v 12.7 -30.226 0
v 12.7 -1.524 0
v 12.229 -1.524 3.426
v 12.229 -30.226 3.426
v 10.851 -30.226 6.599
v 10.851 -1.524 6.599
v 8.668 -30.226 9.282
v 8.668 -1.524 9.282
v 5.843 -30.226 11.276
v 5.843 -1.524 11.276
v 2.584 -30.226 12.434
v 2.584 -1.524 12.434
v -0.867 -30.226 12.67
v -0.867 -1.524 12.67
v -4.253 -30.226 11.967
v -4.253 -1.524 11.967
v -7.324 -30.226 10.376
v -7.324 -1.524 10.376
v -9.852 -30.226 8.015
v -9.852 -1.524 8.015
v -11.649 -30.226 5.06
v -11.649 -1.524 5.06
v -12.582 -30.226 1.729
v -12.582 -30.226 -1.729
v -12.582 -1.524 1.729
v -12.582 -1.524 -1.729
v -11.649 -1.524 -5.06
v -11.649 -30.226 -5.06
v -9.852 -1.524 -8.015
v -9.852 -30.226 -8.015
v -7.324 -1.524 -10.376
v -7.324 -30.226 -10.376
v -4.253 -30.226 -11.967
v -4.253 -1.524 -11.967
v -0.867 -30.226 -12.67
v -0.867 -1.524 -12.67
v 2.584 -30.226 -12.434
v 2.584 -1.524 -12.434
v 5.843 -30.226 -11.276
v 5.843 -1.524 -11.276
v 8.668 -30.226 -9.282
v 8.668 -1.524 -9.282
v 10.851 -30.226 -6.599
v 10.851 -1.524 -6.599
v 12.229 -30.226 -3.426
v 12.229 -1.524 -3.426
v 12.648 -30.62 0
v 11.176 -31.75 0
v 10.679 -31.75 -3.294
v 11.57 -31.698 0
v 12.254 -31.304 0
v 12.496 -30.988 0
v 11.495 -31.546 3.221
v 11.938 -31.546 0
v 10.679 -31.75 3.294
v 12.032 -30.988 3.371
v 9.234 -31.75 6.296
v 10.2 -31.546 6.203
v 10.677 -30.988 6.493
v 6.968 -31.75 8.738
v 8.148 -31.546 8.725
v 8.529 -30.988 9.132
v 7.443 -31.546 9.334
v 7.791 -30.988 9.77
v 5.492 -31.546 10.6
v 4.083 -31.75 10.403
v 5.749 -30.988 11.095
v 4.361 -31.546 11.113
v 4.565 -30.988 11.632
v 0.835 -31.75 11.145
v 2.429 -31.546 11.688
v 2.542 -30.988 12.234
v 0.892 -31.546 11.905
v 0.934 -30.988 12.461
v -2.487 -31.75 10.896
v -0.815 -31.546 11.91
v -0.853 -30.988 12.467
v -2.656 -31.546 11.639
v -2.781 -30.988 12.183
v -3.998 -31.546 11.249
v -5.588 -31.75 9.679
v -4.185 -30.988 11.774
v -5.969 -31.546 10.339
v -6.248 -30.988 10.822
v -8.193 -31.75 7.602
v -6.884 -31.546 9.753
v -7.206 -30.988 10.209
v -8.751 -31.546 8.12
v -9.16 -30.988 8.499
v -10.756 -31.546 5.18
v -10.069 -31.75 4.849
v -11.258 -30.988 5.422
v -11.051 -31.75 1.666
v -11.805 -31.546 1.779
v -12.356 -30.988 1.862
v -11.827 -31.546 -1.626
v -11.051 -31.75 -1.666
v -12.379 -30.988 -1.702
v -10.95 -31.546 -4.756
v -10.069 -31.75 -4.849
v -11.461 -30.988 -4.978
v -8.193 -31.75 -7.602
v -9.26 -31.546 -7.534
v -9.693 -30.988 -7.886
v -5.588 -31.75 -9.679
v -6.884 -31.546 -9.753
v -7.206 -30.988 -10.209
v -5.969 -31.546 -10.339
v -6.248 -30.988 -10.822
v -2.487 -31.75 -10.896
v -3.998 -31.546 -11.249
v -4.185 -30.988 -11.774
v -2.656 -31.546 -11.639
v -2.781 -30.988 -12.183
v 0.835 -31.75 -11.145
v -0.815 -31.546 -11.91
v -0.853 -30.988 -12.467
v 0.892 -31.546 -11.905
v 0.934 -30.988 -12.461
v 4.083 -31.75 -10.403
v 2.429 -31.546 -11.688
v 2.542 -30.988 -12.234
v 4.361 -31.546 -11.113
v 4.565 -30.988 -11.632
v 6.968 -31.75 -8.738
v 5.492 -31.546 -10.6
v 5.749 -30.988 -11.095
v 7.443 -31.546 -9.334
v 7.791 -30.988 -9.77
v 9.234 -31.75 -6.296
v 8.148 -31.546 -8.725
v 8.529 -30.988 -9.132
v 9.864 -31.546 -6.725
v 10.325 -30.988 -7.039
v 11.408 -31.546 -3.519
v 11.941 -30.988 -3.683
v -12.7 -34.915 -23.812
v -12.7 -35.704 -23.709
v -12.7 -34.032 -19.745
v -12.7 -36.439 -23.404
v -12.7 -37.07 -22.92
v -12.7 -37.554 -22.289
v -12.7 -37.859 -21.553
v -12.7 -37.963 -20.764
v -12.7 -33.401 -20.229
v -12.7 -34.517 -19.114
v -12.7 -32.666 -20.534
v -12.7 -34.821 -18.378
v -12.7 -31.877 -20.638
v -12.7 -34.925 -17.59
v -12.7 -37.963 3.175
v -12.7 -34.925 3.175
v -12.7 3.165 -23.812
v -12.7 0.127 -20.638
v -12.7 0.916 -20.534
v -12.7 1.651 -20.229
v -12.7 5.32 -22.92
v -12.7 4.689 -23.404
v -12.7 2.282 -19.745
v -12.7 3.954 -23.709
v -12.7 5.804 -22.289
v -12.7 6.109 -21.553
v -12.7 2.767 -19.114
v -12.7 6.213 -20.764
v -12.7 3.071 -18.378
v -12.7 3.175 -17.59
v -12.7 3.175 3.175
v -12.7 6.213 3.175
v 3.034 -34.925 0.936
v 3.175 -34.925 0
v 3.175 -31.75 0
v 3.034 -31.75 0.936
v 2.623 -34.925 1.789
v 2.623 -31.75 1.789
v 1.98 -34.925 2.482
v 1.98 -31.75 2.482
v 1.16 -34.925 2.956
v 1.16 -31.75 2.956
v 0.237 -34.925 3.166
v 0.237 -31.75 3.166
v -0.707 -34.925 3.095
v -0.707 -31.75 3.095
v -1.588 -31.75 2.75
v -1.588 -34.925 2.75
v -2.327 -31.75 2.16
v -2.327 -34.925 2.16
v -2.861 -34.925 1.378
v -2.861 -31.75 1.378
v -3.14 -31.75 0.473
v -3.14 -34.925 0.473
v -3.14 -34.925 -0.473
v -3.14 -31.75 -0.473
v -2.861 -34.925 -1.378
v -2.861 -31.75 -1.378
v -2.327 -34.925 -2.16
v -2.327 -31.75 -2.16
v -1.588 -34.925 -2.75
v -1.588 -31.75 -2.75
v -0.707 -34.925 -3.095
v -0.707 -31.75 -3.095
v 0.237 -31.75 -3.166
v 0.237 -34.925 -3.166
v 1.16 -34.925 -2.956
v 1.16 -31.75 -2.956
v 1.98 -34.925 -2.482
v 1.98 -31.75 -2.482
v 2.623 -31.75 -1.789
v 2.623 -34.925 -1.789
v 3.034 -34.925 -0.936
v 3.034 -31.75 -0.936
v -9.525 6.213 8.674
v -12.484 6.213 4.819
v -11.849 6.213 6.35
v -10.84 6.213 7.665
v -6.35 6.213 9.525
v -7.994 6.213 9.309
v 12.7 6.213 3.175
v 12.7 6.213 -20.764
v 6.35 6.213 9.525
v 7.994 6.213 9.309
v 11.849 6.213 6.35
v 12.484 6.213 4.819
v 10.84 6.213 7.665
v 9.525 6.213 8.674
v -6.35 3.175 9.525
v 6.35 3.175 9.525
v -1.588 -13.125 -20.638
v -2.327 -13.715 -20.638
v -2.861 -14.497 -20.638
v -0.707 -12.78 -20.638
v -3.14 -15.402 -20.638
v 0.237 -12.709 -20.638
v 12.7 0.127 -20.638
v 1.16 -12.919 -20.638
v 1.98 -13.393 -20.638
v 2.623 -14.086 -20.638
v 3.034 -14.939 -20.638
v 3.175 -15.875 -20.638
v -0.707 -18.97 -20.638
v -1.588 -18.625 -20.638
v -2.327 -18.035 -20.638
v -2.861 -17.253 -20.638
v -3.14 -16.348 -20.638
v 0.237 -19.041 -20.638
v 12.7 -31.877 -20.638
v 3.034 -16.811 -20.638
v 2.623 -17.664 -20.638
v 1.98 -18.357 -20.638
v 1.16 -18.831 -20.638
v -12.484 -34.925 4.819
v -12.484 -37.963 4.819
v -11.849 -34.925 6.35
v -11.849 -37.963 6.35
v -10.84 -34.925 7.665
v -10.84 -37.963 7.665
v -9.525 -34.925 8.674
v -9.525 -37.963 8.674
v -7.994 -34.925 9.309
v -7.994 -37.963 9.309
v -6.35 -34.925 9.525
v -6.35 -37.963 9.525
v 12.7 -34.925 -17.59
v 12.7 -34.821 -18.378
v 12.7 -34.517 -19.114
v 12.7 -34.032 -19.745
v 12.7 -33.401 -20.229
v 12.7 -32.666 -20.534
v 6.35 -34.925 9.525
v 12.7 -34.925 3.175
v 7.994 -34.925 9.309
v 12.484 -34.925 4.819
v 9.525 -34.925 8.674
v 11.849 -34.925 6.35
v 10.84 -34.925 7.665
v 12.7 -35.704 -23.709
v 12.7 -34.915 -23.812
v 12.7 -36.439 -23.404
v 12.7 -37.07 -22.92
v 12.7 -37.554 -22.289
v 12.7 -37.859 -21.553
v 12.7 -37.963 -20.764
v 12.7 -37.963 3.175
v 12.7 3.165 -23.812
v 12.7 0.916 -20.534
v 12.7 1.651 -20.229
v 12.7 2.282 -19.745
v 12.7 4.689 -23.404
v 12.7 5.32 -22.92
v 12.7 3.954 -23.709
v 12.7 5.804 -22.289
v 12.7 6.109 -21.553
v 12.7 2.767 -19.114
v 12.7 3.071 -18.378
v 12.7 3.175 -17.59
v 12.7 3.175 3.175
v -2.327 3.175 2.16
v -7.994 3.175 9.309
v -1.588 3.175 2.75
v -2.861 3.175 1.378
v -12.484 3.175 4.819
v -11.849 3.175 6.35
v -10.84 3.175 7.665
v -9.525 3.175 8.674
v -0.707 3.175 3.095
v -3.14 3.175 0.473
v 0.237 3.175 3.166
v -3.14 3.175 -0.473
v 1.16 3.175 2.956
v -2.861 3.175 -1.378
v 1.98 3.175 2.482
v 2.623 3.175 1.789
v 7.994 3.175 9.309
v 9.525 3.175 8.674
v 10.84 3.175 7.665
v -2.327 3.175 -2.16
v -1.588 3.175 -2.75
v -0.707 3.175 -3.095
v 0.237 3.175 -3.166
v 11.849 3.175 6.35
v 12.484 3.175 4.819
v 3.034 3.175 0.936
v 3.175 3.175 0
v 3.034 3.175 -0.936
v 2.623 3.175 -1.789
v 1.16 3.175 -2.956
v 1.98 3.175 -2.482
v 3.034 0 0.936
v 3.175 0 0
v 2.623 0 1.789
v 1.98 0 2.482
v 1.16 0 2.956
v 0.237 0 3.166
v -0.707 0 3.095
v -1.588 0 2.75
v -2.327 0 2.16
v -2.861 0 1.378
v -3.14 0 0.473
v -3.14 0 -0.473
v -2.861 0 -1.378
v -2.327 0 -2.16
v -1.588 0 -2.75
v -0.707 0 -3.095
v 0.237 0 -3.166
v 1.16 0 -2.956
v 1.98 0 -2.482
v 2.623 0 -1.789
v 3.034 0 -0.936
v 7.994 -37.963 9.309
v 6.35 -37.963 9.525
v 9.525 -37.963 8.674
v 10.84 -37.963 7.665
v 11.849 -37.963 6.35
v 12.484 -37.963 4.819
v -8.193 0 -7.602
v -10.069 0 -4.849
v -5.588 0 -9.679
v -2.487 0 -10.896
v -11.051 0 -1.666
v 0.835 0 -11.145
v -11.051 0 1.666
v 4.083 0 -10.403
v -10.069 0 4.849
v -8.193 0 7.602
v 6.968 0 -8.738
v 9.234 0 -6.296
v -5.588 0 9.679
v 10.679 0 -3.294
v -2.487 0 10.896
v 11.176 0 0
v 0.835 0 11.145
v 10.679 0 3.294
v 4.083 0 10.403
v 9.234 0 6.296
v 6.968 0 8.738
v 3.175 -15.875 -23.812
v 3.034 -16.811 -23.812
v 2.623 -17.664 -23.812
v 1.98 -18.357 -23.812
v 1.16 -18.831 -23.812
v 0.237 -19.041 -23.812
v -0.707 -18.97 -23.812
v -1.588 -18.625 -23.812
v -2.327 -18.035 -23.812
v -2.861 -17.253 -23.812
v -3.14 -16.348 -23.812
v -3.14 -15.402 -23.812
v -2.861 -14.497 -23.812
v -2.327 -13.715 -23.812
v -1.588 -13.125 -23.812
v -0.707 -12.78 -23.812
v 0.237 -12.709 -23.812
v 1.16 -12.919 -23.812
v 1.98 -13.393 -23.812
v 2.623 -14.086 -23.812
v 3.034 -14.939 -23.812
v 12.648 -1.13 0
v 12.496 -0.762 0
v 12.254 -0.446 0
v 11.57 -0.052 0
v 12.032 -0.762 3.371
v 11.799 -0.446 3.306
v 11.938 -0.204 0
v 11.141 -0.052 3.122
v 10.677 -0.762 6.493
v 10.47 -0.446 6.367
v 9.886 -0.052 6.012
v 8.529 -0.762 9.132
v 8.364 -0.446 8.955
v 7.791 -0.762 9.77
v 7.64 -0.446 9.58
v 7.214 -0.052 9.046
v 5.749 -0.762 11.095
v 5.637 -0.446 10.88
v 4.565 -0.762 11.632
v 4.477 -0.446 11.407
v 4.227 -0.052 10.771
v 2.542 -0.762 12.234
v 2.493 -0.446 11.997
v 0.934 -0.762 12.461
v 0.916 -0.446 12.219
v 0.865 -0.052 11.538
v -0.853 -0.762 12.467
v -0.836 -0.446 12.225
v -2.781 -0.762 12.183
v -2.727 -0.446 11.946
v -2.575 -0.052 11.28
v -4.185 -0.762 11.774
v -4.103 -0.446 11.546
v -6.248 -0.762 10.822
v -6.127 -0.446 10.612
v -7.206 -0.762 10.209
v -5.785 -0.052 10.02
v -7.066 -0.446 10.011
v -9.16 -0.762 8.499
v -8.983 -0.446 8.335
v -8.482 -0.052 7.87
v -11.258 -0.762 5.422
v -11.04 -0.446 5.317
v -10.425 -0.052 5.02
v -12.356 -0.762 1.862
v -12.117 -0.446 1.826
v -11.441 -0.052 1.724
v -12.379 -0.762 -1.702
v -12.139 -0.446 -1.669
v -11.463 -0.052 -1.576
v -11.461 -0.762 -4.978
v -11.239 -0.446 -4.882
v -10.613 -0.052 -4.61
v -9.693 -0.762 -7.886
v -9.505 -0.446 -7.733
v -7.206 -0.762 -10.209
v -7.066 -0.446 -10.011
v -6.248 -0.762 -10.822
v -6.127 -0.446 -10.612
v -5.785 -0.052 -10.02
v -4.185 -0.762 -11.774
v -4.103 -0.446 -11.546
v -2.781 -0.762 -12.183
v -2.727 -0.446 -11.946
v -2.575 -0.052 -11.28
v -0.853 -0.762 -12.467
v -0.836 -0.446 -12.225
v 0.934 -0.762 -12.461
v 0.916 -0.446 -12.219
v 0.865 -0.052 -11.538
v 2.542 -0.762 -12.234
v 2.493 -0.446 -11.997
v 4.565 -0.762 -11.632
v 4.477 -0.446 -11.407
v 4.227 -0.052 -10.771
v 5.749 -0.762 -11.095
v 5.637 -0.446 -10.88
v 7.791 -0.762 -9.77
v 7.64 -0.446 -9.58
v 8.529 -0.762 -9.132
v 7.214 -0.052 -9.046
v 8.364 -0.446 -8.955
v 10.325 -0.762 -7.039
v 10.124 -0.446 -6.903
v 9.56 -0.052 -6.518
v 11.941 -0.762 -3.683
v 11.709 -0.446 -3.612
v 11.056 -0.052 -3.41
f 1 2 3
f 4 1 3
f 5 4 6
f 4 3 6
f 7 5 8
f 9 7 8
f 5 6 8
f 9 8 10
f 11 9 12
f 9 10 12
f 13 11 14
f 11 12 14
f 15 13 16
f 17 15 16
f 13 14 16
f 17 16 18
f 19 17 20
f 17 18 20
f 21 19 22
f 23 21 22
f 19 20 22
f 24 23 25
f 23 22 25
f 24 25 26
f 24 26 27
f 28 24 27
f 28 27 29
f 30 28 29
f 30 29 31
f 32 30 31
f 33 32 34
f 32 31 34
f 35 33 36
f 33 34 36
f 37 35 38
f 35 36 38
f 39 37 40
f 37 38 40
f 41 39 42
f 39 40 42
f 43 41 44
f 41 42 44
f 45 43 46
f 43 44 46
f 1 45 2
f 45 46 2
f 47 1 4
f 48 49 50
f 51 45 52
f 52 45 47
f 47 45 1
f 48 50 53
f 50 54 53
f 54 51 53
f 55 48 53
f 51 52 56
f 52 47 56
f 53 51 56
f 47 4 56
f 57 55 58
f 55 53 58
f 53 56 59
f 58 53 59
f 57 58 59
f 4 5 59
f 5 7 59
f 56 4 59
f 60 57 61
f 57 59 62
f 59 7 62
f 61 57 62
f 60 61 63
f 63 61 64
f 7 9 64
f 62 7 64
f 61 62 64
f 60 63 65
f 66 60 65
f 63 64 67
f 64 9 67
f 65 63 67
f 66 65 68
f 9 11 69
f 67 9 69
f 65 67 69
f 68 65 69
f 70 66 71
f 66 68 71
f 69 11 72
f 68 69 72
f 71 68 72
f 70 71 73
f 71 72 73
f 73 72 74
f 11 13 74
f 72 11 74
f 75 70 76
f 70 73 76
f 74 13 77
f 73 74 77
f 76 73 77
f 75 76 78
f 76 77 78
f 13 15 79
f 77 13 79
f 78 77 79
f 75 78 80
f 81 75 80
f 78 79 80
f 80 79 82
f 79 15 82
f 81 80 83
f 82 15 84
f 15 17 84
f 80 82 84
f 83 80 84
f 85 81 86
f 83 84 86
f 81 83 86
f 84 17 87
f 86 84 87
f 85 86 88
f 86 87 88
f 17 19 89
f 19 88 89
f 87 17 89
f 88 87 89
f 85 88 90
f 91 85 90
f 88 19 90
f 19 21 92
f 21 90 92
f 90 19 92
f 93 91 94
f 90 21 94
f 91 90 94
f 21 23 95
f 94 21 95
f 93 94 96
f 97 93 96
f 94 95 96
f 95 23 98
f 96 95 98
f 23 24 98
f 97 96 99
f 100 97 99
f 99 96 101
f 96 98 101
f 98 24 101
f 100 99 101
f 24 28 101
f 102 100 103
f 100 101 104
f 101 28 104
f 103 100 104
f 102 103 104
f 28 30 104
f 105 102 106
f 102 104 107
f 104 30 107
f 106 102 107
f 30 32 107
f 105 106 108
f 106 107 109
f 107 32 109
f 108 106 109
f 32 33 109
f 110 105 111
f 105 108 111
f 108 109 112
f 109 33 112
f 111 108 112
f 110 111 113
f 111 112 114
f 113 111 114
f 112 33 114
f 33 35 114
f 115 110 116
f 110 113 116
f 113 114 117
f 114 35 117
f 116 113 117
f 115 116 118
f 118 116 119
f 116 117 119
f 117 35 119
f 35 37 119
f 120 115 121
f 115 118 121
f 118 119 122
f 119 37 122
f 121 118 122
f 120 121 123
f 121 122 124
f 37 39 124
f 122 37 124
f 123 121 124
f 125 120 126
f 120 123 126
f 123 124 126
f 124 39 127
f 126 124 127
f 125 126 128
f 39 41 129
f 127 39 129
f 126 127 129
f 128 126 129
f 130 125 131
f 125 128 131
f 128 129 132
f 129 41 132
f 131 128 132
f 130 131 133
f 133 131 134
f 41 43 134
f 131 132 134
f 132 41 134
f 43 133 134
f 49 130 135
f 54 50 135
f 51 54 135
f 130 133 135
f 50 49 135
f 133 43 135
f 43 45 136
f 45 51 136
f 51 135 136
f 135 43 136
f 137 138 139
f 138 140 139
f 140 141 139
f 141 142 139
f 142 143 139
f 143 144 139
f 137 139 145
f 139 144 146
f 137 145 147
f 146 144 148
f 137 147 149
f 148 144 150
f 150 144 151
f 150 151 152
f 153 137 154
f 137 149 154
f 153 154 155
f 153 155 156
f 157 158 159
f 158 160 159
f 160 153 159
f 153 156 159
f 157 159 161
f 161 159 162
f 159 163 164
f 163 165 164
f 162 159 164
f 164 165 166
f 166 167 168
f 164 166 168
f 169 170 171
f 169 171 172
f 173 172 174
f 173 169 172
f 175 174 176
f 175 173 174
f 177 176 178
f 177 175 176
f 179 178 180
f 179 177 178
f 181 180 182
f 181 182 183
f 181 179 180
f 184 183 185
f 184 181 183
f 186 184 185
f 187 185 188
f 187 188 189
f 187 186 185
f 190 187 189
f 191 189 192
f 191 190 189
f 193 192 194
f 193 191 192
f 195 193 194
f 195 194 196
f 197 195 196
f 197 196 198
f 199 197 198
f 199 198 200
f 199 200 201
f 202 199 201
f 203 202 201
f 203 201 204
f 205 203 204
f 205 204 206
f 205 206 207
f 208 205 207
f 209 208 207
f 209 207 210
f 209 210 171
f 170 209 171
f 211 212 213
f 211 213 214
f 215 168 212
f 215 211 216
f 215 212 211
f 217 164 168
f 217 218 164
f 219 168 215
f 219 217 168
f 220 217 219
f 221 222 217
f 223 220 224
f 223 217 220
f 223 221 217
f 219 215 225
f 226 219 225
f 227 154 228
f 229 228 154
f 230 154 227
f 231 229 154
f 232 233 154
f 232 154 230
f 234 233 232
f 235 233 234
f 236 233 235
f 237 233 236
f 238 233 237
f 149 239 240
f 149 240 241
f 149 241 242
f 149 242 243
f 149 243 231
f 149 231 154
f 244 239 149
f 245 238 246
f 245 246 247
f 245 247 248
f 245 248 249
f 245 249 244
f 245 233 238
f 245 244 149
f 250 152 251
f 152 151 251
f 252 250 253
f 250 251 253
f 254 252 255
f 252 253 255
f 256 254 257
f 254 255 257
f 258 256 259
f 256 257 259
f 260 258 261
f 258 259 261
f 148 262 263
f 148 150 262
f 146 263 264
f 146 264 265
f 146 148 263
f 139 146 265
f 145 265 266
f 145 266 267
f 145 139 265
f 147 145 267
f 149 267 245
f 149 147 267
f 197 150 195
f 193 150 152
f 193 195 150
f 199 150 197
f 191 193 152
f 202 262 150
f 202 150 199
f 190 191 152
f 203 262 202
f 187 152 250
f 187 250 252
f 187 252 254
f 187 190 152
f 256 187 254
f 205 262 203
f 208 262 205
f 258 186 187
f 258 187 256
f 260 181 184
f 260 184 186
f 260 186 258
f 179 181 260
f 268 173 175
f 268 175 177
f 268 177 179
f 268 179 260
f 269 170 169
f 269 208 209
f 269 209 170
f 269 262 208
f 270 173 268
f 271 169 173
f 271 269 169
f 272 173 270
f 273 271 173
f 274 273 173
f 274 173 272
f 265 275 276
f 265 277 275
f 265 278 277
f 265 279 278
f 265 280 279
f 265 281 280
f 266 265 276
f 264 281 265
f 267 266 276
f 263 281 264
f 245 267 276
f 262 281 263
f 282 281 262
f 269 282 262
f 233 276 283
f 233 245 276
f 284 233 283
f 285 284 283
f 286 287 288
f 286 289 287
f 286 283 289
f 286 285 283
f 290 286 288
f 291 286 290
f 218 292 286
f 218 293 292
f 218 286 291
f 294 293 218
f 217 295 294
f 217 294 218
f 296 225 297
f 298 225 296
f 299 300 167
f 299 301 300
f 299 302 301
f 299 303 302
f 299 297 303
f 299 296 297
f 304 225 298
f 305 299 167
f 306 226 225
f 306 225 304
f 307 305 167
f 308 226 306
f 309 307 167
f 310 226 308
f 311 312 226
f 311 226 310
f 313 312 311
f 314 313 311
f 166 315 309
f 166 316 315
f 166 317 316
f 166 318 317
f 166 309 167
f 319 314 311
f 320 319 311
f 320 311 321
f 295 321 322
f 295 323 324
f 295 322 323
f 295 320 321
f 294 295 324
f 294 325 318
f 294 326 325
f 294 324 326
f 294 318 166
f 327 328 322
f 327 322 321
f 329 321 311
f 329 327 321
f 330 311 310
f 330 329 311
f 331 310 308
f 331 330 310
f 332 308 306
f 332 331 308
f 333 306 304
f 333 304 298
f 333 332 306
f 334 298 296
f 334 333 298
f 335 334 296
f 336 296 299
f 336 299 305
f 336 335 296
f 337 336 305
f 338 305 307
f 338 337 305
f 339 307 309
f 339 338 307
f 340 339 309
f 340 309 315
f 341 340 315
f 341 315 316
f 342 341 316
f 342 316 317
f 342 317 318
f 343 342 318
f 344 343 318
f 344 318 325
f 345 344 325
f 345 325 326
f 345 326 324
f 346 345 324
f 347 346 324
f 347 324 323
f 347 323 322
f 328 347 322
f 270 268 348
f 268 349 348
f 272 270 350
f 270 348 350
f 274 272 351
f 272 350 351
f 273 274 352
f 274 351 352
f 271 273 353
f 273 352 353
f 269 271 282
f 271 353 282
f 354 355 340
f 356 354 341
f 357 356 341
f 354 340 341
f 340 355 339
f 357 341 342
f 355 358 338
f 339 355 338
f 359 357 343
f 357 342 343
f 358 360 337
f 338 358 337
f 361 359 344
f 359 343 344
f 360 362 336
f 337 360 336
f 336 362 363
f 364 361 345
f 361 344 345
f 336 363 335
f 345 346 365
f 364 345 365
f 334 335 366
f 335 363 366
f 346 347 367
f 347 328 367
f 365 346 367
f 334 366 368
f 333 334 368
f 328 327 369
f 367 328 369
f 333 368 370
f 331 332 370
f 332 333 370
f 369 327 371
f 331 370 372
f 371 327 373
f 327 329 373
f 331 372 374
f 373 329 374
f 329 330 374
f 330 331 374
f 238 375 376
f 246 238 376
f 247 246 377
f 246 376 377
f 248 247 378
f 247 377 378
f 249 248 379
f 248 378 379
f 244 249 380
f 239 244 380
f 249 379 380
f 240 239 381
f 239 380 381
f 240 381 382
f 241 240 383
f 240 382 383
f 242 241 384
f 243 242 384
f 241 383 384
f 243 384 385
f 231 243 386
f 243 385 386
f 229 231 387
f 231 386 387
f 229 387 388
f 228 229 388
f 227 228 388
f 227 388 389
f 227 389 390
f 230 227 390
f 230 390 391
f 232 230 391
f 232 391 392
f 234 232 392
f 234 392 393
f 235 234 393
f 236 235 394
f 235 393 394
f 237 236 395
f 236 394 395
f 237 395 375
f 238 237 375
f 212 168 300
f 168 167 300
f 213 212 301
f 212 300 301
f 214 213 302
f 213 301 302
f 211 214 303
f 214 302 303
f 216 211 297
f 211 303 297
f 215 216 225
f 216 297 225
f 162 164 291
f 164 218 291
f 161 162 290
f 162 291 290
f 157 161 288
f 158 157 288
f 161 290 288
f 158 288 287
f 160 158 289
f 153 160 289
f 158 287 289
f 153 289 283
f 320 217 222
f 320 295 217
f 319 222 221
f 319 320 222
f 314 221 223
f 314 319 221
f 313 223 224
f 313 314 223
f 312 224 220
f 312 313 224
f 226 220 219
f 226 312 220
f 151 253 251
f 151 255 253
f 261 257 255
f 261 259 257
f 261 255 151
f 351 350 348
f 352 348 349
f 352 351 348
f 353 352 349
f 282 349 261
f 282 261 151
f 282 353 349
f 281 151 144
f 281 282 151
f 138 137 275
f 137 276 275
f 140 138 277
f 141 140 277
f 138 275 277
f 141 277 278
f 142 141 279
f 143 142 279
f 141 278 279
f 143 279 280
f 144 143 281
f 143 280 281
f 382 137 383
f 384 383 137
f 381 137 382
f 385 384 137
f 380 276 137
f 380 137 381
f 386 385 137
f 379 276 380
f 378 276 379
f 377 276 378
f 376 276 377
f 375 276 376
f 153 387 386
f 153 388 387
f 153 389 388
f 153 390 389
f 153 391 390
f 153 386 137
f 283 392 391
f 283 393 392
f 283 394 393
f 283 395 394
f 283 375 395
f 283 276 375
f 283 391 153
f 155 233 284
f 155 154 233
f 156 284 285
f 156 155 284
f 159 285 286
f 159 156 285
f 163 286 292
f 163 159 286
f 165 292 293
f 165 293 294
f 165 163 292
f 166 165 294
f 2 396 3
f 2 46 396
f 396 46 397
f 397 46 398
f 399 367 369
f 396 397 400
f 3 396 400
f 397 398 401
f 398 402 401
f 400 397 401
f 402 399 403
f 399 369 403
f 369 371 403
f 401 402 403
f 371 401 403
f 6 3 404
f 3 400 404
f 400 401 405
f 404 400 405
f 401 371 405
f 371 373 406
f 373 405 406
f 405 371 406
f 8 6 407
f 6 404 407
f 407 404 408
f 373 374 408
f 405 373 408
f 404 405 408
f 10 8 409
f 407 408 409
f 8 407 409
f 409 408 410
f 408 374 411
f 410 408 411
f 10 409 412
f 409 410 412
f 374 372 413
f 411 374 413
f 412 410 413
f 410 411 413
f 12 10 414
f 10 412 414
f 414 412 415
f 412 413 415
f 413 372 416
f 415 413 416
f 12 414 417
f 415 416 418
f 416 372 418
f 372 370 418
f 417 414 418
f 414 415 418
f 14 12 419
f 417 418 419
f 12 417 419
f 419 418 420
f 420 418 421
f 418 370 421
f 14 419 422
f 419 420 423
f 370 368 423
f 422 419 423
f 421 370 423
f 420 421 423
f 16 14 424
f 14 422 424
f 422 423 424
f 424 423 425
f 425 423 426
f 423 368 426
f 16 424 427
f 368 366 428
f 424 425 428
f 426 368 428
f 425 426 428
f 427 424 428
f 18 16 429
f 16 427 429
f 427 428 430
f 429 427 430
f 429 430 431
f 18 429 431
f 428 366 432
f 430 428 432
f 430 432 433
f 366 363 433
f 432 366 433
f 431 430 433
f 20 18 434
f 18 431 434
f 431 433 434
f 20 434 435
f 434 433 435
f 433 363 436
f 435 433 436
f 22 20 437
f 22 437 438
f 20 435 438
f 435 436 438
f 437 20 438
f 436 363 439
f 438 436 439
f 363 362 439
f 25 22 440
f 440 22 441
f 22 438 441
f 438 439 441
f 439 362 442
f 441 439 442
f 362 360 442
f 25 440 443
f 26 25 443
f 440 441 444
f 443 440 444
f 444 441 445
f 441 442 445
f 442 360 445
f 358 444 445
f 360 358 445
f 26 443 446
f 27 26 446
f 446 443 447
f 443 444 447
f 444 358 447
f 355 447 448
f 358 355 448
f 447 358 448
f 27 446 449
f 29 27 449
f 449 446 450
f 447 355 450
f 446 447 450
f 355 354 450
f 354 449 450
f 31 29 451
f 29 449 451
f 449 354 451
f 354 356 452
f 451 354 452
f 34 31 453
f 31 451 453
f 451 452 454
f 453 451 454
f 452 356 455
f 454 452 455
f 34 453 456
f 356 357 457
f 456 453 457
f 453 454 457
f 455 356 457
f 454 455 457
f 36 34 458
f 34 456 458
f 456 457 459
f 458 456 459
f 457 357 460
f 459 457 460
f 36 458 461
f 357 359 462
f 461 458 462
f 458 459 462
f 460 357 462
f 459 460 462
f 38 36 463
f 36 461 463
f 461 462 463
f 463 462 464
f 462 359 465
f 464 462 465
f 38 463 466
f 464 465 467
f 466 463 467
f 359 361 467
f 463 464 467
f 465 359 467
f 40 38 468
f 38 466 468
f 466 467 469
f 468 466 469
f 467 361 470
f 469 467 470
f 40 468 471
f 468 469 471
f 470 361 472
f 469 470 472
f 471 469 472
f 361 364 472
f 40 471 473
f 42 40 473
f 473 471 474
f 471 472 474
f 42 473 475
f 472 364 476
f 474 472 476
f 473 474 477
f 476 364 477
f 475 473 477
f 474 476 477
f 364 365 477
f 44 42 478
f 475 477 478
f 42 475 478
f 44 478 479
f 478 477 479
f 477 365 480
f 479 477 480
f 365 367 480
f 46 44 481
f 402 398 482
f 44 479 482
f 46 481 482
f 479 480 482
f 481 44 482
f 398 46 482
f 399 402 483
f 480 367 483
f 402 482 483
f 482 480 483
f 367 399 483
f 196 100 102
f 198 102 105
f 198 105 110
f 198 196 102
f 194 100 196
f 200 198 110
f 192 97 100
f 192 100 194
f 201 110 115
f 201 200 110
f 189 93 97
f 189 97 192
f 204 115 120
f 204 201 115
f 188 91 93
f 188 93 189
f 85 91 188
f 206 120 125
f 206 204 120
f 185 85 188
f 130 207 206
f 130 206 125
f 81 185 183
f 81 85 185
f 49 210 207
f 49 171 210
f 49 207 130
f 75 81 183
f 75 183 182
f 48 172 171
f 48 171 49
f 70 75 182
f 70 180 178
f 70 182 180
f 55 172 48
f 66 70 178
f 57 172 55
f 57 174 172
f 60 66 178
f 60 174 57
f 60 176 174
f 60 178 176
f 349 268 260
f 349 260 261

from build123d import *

# Parameters (mm, degrees)
F0_R          = 12.7
F0_R_2        = 3.175
F1_DEPTH      = 31.75
F3_DEPTH      = 12.7
F3_DEPTH_BACK = 12.7
F4_R          = 3.048
F5_R          = 6.35
F6_R          = 3.175
F7_DEPTH      = 44.17668
F8_R          = 3.175
F9_DEPTH      = 44.17568
F10_R         = 3.175
F11_DEPTH     = 3.175
F12_R         = 1.524


with BuildPart() as f1:
    # F0 (on Front) → F1 (new body)
    with BuildSketch(Plane.XZ):
        Circle(F0_R)
        Circle(F0_R_2, mode=Mode.SUBTRACT)
    extrude(amount=F1_DEPTH)



with BuildPart() as f3:
    # F2 (on Right) → F3 (new body, two sides)
    with BuildSketch(Plane.YZ) as f3_sk:
        Polygon((-34.925, -20.6375), (-34.925, 9.525), (-37.96284, 9.525), (-37.96284, -23.8125), (6.21284, -23.8125), (6.21284, 9.525), (3.175, 9.525), (3.175, -20.6375), align=None)
    extrude(amount=F3_DEPTH)
    extrude(f3_sk.sketch, amount=-F3_DEPTH_BACK)

    # F4
    f4_edges = [f3.edges().sort_by_distance(p)[0] for p in [
        (0, -37.96284, -23.8125),
        (0, -34.925, -20.6375),
        (0, 3.175, -20.6375),
        (0, 6.21284, -23.8125),
    ]]
    fillet(f4_edges, radius=F4_R)

    # F5
    f5_edges = [f3.edges().sort_by_distance(p)[0] for p in [
        (12.7, -36.44392, 9.525),
        (-12.7, -36.44392, 9.525),
        (-12.7, 4.69392, 9.525),
        (12.7, 4.69392, 9.525),
    ]]
    fillet(f5_edges, radius=F5_R)

    # F6 (on face) → F7 (cut, through all)
    with BuildSketch(Plane.XZ.offset(37.96284)):
        Circle(F6_R)
    extrude(amount=-F7_DEPTH, mode=Mode.SUBTRACT)


with BuildPart() as f1_1:
    add(f1.part)

    add(f3.part)  # F9 merges F3
    # F8 (on face) → F9 (join, through all)
    with BuildSketch(Plane.XZ.offset(37.96284)):
        Circle(F8_R)
    extrude(amount=-F9_DEPTH)

    # F10 (on face) → F11 (cut, through all)
    with BuildSketch(Plane(origin=(0, 0, -23.8125), x_dir=(1, 0, 0), z_dir=(0, 0, -1))):
        with Locations((0, 15.875)):
            Circle(F10_R)
    extrude(amount=-F11_DEPTH, mode=Mode.SUBTRACT)

    # F12
    f12_edges = [f1_1.edges().sort_by_distance(p)[0] for p in [
        (-12.7, -31.75, 0),
        (-12.7, 0, 0),
    ]]
    fillet(f12_edges, radius=F12_R)


solid = f1_1.part
